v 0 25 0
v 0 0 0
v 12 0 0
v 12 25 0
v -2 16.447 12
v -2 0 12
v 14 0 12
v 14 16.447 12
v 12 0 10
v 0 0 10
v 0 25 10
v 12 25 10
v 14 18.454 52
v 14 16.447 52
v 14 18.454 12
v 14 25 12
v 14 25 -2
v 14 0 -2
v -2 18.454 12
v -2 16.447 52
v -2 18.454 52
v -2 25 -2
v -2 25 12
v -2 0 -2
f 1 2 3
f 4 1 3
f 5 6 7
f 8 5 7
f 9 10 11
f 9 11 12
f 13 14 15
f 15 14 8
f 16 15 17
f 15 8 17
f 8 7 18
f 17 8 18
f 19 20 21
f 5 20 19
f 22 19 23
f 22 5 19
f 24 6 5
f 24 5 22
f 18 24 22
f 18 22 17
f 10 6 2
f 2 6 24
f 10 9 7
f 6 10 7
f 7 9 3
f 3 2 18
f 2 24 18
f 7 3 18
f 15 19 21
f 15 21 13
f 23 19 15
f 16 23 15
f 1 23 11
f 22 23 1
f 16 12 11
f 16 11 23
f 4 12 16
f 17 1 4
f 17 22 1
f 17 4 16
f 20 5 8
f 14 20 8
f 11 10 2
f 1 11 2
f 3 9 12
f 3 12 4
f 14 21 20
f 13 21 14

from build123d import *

# Parameters (mm, degrees)
SKETCH_1_W      = 12
SKETCH_1_H      = 10
EXTRUDE_1_DEPTH = 25
SHELL_1_T       = 2
SKETCH_2_W      = 16
SKETCH_2_H      = 2.007499683
EXTRUDE_2_DEPTH = 40


with BuildPart() as part:
    # 草图1 → 凸台-拉伸1 (new body)
    with BuildSketch(Plane(origin=(0, 0, 0), x_dir=(1, 0, 0), z_dir=(0, 1, 0))):
        with Locations((6, -5)):
            Rectangle(SKETCH_1_W, SKETCH_1_H)
    extrude(amount=EXTRUDE_1_DEPTH)

    # 抽壳1
    shell_1_openings = [part.faces().sort_by_distance(p)[0] for p in [
        (6, 0, 5),
        (6, 25, 5),
    ]]
    offset(amount=SHELL_1_T, openings=shell_1_openings, kind=Kind.INTERSECTION)

    # 草图2 → 凸台-拉伸2 (add)
    with BuildSketch(Plane.XY.offset(12)):
        with Locations((6, 17.450698372)):
            Rectangle(SKETCH_2_W, SKETCH_2_H)
    extrude(amount=EXTRUDE_2_DEPTH)


solid = part.part
